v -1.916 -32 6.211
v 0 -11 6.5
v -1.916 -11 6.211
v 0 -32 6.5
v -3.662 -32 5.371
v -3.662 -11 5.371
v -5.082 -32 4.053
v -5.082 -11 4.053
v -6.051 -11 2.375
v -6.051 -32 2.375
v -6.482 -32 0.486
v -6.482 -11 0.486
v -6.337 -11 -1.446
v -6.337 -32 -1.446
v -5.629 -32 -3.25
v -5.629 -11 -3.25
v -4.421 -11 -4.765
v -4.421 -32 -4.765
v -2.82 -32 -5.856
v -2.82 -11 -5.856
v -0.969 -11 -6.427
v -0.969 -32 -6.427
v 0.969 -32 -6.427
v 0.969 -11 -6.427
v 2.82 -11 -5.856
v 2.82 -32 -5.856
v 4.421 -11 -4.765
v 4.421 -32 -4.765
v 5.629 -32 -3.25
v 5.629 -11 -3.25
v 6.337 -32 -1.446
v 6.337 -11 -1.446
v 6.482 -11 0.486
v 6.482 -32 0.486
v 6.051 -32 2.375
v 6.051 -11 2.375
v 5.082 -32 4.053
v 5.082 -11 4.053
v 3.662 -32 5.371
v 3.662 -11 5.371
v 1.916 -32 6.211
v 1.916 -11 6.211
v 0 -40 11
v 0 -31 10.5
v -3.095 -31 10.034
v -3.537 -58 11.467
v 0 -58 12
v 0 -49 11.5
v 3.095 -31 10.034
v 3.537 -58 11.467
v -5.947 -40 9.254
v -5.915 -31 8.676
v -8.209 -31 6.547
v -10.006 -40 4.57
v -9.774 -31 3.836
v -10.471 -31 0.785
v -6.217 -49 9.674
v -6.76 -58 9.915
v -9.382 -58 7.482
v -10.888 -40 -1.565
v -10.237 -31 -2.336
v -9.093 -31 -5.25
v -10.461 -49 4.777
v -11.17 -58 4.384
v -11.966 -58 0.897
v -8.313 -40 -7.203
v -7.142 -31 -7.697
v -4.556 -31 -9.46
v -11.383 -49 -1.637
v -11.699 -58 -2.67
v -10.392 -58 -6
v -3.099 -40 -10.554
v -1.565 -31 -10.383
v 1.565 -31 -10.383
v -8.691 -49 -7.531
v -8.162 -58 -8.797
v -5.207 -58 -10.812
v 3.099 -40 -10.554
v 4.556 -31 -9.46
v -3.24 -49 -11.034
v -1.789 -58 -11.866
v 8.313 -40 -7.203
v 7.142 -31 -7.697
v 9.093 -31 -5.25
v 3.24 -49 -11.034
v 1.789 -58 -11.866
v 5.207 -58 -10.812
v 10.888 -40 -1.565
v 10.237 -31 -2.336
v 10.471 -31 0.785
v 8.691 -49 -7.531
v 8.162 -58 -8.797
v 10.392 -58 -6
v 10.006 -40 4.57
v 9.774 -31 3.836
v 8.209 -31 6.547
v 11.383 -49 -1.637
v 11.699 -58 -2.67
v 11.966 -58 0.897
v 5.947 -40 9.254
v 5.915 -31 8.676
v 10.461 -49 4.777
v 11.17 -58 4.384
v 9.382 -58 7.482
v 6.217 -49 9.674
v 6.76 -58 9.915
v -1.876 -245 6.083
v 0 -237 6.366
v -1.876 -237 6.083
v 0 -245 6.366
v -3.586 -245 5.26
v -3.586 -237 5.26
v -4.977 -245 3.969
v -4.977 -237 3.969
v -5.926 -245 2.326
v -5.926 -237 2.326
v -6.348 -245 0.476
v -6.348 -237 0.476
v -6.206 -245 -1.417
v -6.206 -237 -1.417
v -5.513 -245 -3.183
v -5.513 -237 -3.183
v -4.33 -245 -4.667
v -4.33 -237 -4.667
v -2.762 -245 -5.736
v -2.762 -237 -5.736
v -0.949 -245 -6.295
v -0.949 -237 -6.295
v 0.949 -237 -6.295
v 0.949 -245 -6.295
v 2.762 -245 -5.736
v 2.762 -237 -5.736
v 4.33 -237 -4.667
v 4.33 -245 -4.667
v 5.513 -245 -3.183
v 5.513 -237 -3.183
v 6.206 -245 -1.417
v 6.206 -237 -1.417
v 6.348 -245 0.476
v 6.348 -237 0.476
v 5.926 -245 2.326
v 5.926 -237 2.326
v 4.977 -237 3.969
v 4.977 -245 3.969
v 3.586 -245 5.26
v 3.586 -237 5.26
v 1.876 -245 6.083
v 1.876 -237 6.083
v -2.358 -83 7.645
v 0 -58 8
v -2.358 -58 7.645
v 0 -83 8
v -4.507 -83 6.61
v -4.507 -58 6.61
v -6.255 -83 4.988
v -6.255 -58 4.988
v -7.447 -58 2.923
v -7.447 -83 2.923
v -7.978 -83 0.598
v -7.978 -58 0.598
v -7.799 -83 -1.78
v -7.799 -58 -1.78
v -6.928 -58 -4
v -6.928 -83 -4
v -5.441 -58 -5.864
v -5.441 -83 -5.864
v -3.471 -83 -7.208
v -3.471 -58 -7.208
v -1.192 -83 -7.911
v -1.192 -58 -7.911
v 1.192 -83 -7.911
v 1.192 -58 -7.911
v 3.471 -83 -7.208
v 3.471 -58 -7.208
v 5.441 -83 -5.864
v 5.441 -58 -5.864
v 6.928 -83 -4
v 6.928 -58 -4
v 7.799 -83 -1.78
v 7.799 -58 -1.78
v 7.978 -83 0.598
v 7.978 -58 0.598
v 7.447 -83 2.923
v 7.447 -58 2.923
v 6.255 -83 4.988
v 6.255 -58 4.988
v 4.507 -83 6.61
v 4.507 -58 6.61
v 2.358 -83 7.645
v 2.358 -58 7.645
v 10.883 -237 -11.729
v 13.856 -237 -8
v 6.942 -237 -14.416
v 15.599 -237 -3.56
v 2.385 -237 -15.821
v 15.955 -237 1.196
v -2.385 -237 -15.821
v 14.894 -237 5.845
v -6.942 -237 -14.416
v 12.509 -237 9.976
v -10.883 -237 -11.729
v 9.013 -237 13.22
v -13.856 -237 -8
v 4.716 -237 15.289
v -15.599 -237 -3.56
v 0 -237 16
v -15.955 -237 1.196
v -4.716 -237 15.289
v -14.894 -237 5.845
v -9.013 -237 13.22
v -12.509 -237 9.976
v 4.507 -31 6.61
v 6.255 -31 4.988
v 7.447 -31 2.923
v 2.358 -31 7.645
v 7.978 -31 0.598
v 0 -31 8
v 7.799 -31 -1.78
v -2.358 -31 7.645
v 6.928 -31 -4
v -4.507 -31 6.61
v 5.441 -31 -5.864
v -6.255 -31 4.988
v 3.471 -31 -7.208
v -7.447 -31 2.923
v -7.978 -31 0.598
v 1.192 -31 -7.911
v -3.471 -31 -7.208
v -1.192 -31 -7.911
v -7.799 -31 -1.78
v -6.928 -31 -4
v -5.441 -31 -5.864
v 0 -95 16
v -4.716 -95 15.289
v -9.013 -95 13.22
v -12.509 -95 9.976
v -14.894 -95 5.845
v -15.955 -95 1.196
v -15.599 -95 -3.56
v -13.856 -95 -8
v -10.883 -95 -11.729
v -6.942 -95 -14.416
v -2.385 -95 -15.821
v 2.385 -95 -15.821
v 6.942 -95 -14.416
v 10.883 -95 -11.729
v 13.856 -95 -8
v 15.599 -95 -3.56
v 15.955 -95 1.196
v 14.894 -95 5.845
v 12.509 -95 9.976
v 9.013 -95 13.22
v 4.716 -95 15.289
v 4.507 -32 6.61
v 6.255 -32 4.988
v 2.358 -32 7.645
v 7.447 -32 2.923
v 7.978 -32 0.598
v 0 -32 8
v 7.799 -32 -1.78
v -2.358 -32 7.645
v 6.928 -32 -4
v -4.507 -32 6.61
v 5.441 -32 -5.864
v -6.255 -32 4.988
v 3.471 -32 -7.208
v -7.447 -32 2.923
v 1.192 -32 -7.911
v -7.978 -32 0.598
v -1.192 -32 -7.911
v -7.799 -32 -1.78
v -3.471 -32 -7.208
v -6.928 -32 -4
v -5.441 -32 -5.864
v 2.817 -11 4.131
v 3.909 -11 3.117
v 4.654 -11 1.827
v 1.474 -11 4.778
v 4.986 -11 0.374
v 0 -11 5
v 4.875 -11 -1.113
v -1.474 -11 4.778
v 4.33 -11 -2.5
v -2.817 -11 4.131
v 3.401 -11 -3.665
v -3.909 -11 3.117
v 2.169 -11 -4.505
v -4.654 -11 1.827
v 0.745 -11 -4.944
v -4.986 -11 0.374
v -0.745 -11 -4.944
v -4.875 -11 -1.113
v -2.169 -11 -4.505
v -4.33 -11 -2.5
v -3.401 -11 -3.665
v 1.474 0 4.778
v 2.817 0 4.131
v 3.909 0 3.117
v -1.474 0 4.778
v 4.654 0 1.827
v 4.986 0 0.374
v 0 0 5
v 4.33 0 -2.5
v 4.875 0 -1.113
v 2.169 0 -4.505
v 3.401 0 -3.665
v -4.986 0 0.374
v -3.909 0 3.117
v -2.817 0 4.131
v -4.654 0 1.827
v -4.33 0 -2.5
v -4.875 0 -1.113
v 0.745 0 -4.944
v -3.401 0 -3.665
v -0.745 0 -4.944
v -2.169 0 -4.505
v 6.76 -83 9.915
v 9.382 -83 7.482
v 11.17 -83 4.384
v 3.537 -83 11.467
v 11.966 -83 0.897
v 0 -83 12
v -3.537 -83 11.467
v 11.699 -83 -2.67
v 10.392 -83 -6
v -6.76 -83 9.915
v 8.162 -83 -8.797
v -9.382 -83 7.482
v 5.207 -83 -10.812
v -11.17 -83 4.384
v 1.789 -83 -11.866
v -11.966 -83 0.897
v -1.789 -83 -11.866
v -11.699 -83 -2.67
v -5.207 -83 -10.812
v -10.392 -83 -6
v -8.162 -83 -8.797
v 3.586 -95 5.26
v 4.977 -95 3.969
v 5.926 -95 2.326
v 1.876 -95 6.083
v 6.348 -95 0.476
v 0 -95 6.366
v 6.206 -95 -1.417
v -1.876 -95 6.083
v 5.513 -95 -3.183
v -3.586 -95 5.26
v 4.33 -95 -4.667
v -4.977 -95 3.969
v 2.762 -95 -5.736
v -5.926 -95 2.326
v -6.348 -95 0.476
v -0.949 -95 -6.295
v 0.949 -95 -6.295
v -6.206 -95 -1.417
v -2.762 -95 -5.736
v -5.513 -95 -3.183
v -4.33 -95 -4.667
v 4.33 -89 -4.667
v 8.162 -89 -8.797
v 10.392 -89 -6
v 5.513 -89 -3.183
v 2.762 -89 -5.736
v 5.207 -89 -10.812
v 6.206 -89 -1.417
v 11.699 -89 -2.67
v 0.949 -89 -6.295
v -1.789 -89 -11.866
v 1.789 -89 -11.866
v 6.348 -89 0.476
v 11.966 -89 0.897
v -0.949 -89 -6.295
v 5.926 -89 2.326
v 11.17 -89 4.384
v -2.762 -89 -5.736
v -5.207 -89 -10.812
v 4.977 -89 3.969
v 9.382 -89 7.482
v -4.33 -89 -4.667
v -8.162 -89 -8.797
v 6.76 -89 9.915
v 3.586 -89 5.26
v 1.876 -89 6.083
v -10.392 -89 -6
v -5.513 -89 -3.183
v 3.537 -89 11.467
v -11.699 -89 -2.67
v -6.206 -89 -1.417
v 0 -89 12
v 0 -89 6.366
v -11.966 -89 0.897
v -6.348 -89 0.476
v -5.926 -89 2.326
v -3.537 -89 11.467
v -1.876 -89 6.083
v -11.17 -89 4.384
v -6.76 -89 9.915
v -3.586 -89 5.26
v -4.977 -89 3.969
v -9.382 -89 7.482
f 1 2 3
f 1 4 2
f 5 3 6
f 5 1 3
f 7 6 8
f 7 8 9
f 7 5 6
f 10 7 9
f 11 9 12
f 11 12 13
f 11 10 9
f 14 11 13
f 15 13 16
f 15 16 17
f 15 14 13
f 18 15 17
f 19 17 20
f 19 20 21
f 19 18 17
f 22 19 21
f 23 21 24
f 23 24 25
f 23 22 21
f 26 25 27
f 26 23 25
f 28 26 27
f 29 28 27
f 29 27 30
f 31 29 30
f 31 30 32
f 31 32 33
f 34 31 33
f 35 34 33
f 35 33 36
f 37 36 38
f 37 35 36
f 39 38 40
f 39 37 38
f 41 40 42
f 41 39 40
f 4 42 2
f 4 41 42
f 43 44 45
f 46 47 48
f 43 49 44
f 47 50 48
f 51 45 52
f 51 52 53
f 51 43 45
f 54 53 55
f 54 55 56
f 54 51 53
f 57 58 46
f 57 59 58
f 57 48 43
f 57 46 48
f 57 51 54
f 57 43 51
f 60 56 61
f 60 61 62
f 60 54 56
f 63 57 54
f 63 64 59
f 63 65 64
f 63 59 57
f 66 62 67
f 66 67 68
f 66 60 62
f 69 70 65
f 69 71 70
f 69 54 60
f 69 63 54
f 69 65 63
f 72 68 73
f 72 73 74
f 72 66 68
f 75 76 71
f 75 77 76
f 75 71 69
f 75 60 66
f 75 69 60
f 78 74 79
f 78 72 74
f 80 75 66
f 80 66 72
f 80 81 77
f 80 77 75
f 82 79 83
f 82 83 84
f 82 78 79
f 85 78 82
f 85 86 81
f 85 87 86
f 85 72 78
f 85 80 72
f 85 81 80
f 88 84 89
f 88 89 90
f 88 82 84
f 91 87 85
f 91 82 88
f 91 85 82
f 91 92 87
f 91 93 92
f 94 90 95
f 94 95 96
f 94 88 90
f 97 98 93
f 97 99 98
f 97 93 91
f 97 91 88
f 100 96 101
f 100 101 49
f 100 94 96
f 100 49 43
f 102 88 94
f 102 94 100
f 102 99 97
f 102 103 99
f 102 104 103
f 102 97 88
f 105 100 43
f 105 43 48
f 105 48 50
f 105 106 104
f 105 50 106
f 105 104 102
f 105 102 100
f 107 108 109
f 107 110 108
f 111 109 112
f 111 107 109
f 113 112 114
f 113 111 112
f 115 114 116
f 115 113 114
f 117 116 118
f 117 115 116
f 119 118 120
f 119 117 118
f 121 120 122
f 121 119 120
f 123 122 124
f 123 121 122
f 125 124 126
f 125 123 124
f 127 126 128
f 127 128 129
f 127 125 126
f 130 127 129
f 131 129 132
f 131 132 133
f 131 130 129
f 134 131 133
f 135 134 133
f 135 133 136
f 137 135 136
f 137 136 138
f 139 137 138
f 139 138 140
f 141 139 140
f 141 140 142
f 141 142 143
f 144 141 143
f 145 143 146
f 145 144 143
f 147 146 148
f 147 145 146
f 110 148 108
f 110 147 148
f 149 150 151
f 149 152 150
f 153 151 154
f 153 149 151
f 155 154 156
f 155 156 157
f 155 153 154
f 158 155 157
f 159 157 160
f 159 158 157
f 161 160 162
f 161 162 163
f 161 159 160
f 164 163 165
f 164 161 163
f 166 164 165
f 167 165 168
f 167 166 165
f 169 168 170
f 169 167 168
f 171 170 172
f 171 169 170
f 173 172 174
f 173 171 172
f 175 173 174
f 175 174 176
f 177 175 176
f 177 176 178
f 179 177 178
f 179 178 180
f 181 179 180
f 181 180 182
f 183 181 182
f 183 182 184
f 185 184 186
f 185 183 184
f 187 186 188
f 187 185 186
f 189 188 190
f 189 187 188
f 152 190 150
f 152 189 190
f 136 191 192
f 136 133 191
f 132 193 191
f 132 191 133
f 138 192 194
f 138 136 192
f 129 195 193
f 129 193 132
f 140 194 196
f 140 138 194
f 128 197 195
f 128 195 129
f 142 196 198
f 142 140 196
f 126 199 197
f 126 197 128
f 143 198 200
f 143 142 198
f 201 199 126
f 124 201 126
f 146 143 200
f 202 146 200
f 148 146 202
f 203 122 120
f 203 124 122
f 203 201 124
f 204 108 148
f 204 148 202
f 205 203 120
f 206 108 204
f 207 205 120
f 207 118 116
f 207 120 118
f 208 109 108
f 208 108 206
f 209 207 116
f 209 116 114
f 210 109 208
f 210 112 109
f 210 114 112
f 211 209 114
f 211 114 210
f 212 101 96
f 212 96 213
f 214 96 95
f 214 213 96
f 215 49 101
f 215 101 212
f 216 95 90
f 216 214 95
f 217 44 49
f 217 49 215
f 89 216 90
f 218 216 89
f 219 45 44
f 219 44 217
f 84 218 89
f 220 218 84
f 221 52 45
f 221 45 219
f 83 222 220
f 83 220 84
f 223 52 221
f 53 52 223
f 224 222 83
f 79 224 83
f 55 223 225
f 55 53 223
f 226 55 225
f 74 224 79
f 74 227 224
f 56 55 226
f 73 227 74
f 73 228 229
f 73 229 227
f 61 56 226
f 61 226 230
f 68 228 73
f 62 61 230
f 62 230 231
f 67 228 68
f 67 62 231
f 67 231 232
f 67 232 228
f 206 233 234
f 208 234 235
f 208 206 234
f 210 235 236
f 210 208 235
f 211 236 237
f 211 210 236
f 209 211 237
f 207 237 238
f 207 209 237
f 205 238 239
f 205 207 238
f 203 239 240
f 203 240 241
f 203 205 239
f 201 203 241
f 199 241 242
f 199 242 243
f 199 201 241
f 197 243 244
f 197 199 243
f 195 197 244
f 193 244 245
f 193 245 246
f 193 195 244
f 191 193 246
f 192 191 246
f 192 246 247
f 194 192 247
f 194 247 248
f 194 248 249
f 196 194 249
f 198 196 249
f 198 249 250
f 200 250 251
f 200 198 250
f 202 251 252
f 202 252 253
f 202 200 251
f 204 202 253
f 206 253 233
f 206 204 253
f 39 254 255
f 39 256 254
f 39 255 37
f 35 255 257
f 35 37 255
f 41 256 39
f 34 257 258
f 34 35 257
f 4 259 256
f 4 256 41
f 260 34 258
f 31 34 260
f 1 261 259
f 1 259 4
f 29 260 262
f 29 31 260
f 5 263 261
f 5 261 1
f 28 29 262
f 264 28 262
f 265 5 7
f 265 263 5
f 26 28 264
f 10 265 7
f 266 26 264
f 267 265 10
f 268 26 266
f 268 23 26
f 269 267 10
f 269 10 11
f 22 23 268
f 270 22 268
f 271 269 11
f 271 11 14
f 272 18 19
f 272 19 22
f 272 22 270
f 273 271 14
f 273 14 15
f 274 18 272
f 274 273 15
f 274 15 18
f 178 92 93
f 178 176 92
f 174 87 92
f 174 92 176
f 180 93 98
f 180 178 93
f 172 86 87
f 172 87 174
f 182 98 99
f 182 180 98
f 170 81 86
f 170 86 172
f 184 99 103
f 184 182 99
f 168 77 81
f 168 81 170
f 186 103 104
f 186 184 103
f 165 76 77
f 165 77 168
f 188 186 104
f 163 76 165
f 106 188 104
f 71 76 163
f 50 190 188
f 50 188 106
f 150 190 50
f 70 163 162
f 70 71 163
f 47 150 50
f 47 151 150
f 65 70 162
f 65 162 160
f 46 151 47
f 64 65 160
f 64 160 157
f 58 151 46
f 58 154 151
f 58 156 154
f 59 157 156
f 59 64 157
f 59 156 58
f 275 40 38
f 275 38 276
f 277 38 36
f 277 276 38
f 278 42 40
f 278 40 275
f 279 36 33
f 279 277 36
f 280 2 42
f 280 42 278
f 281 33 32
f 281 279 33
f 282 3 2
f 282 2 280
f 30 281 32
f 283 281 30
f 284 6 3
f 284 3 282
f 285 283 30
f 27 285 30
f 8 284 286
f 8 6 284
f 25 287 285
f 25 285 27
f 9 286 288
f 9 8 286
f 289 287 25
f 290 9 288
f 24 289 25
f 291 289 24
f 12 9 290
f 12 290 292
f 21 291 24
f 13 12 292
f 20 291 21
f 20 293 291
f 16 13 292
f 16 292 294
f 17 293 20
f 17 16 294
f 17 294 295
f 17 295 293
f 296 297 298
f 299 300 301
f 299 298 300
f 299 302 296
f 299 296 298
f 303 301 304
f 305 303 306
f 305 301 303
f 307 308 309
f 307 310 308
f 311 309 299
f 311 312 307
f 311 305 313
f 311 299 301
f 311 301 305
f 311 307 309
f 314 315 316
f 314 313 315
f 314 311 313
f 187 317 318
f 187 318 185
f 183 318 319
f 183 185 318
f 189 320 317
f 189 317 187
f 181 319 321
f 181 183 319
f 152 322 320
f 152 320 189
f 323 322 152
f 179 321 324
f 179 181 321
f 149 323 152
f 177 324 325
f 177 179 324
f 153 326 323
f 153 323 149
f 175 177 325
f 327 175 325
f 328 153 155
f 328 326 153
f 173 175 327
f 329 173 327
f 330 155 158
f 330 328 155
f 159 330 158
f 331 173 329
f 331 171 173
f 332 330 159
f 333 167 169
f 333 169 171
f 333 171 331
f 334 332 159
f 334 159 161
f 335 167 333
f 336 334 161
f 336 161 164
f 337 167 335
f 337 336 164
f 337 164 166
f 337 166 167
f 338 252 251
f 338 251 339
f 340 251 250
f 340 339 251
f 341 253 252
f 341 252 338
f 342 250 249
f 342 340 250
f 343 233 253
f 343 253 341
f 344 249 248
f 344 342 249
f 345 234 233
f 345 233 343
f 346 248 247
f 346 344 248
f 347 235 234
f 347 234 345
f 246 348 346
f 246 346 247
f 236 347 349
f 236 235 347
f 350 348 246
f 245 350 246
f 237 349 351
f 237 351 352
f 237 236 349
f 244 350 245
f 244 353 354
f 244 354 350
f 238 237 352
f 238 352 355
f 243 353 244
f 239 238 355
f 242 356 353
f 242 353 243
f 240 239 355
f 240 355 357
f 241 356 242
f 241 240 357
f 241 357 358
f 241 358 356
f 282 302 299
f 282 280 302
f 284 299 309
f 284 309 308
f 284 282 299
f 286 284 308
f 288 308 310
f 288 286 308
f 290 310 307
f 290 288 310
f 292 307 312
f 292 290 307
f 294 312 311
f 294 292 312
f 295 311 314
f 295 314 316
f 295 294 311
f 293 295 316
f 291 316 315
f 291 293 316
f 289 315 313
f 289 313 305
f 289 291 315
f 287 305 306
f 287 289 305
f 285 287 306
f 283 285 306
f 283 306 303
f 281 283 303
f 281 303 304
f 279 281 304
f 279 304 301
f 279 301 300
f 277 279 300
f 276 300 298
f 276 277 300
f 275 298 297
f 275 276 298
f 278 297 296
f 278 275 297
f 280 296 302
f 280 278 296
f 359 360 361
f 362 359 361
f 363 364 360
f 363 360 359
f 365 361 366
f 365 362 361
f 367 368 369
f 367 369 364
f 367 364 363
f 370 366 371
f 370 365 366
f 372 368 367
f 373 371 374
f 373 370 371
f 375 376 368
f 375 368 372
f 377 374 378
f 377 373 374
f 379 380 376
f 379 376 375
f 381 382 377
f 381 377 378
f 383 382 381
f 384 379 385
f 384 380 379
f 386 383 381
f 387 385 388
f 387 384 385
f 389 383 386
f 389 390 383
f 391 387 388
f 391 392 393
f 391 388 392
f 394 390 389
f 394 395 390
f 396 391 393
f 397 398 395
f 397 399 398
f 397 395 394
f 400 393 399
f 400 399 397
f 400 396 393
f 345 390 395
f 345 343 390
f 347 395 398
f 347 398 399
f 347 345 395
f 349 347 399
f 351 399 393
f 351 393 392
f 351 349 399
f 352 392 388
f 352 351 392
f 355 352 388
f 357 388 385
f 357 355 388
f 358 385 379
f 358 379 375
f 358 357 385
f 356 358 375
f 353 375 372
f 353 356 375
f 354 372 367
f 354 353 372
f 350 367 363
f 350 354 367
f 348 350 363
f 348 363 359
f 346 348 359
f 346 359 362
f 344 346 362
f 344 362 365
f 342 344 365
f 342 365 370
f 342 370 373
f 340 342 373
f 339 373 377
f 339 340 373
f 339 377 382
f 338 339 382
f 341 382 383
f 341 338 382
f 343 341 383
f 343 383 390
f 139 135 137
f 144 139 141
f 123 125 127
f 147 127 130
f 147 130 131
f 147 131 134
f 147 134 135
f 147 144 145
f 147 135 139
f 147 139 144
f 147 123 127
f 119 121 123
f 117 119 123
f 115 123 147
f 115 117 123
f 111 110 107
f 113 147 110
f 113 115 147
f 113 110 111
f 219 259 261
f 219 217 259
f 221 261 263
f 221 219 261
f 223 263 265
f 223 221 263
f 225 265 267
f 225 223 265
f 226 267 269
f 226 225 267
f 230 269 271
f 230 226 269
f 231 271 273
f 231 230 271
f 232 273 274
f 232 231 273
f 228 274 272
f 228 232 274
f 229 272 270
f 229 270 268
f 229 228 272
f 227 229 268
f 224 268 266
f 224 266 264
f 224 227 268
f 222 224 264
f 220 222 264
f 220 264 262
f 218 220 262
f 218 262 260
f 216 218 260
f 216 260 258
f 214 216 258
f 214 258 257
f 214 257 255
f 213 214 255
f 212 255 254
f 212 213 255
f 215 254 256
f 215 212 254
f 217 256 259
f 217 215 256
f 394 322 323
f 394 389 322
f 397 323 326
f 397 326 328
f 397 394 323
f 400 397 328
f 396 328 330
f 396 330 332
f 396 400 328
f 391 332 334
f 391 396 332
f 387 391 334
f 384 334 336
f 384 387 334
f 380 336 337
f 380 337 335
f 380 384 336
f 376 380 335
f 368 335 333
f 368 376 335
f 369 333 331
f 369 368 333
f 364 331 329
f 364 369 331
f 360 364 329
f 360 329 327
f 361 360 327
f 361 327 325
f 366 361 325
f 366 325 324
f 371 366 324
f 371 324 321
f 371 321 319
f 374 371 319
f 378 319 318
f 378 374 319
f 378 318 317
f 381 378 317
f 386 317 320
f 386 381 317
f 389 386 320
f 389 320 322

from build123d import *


with BuildPart() as part:
    # Çizim1 → Döndür1 (revolve)
    with BuildSketch(Plane.XY, mode=Mode.PRIVATE) as d_nd_r1_sk:
        Polygon((0, 0), (5, 0), (5, -11), (6.5, -11), (6.5, -32), (8, -32), (8, -31), (10.5, -31), (12, -58), (8, -58), (8, -83), (12, -83), (12, -89), (6.365949077, -89), (6.365949077, -95), (16, -95), (16, -237), (6.365949077, -237), (6.365949077, -245), (0, -245), align=None)
    revolve(d_nd_r1_sk.sketch.rotate(Axis((0, 0, 0), (0, -1, 0)), 90), axis=Axis((0, 0, 0), (0, -1, 0)))


solid = part.part
